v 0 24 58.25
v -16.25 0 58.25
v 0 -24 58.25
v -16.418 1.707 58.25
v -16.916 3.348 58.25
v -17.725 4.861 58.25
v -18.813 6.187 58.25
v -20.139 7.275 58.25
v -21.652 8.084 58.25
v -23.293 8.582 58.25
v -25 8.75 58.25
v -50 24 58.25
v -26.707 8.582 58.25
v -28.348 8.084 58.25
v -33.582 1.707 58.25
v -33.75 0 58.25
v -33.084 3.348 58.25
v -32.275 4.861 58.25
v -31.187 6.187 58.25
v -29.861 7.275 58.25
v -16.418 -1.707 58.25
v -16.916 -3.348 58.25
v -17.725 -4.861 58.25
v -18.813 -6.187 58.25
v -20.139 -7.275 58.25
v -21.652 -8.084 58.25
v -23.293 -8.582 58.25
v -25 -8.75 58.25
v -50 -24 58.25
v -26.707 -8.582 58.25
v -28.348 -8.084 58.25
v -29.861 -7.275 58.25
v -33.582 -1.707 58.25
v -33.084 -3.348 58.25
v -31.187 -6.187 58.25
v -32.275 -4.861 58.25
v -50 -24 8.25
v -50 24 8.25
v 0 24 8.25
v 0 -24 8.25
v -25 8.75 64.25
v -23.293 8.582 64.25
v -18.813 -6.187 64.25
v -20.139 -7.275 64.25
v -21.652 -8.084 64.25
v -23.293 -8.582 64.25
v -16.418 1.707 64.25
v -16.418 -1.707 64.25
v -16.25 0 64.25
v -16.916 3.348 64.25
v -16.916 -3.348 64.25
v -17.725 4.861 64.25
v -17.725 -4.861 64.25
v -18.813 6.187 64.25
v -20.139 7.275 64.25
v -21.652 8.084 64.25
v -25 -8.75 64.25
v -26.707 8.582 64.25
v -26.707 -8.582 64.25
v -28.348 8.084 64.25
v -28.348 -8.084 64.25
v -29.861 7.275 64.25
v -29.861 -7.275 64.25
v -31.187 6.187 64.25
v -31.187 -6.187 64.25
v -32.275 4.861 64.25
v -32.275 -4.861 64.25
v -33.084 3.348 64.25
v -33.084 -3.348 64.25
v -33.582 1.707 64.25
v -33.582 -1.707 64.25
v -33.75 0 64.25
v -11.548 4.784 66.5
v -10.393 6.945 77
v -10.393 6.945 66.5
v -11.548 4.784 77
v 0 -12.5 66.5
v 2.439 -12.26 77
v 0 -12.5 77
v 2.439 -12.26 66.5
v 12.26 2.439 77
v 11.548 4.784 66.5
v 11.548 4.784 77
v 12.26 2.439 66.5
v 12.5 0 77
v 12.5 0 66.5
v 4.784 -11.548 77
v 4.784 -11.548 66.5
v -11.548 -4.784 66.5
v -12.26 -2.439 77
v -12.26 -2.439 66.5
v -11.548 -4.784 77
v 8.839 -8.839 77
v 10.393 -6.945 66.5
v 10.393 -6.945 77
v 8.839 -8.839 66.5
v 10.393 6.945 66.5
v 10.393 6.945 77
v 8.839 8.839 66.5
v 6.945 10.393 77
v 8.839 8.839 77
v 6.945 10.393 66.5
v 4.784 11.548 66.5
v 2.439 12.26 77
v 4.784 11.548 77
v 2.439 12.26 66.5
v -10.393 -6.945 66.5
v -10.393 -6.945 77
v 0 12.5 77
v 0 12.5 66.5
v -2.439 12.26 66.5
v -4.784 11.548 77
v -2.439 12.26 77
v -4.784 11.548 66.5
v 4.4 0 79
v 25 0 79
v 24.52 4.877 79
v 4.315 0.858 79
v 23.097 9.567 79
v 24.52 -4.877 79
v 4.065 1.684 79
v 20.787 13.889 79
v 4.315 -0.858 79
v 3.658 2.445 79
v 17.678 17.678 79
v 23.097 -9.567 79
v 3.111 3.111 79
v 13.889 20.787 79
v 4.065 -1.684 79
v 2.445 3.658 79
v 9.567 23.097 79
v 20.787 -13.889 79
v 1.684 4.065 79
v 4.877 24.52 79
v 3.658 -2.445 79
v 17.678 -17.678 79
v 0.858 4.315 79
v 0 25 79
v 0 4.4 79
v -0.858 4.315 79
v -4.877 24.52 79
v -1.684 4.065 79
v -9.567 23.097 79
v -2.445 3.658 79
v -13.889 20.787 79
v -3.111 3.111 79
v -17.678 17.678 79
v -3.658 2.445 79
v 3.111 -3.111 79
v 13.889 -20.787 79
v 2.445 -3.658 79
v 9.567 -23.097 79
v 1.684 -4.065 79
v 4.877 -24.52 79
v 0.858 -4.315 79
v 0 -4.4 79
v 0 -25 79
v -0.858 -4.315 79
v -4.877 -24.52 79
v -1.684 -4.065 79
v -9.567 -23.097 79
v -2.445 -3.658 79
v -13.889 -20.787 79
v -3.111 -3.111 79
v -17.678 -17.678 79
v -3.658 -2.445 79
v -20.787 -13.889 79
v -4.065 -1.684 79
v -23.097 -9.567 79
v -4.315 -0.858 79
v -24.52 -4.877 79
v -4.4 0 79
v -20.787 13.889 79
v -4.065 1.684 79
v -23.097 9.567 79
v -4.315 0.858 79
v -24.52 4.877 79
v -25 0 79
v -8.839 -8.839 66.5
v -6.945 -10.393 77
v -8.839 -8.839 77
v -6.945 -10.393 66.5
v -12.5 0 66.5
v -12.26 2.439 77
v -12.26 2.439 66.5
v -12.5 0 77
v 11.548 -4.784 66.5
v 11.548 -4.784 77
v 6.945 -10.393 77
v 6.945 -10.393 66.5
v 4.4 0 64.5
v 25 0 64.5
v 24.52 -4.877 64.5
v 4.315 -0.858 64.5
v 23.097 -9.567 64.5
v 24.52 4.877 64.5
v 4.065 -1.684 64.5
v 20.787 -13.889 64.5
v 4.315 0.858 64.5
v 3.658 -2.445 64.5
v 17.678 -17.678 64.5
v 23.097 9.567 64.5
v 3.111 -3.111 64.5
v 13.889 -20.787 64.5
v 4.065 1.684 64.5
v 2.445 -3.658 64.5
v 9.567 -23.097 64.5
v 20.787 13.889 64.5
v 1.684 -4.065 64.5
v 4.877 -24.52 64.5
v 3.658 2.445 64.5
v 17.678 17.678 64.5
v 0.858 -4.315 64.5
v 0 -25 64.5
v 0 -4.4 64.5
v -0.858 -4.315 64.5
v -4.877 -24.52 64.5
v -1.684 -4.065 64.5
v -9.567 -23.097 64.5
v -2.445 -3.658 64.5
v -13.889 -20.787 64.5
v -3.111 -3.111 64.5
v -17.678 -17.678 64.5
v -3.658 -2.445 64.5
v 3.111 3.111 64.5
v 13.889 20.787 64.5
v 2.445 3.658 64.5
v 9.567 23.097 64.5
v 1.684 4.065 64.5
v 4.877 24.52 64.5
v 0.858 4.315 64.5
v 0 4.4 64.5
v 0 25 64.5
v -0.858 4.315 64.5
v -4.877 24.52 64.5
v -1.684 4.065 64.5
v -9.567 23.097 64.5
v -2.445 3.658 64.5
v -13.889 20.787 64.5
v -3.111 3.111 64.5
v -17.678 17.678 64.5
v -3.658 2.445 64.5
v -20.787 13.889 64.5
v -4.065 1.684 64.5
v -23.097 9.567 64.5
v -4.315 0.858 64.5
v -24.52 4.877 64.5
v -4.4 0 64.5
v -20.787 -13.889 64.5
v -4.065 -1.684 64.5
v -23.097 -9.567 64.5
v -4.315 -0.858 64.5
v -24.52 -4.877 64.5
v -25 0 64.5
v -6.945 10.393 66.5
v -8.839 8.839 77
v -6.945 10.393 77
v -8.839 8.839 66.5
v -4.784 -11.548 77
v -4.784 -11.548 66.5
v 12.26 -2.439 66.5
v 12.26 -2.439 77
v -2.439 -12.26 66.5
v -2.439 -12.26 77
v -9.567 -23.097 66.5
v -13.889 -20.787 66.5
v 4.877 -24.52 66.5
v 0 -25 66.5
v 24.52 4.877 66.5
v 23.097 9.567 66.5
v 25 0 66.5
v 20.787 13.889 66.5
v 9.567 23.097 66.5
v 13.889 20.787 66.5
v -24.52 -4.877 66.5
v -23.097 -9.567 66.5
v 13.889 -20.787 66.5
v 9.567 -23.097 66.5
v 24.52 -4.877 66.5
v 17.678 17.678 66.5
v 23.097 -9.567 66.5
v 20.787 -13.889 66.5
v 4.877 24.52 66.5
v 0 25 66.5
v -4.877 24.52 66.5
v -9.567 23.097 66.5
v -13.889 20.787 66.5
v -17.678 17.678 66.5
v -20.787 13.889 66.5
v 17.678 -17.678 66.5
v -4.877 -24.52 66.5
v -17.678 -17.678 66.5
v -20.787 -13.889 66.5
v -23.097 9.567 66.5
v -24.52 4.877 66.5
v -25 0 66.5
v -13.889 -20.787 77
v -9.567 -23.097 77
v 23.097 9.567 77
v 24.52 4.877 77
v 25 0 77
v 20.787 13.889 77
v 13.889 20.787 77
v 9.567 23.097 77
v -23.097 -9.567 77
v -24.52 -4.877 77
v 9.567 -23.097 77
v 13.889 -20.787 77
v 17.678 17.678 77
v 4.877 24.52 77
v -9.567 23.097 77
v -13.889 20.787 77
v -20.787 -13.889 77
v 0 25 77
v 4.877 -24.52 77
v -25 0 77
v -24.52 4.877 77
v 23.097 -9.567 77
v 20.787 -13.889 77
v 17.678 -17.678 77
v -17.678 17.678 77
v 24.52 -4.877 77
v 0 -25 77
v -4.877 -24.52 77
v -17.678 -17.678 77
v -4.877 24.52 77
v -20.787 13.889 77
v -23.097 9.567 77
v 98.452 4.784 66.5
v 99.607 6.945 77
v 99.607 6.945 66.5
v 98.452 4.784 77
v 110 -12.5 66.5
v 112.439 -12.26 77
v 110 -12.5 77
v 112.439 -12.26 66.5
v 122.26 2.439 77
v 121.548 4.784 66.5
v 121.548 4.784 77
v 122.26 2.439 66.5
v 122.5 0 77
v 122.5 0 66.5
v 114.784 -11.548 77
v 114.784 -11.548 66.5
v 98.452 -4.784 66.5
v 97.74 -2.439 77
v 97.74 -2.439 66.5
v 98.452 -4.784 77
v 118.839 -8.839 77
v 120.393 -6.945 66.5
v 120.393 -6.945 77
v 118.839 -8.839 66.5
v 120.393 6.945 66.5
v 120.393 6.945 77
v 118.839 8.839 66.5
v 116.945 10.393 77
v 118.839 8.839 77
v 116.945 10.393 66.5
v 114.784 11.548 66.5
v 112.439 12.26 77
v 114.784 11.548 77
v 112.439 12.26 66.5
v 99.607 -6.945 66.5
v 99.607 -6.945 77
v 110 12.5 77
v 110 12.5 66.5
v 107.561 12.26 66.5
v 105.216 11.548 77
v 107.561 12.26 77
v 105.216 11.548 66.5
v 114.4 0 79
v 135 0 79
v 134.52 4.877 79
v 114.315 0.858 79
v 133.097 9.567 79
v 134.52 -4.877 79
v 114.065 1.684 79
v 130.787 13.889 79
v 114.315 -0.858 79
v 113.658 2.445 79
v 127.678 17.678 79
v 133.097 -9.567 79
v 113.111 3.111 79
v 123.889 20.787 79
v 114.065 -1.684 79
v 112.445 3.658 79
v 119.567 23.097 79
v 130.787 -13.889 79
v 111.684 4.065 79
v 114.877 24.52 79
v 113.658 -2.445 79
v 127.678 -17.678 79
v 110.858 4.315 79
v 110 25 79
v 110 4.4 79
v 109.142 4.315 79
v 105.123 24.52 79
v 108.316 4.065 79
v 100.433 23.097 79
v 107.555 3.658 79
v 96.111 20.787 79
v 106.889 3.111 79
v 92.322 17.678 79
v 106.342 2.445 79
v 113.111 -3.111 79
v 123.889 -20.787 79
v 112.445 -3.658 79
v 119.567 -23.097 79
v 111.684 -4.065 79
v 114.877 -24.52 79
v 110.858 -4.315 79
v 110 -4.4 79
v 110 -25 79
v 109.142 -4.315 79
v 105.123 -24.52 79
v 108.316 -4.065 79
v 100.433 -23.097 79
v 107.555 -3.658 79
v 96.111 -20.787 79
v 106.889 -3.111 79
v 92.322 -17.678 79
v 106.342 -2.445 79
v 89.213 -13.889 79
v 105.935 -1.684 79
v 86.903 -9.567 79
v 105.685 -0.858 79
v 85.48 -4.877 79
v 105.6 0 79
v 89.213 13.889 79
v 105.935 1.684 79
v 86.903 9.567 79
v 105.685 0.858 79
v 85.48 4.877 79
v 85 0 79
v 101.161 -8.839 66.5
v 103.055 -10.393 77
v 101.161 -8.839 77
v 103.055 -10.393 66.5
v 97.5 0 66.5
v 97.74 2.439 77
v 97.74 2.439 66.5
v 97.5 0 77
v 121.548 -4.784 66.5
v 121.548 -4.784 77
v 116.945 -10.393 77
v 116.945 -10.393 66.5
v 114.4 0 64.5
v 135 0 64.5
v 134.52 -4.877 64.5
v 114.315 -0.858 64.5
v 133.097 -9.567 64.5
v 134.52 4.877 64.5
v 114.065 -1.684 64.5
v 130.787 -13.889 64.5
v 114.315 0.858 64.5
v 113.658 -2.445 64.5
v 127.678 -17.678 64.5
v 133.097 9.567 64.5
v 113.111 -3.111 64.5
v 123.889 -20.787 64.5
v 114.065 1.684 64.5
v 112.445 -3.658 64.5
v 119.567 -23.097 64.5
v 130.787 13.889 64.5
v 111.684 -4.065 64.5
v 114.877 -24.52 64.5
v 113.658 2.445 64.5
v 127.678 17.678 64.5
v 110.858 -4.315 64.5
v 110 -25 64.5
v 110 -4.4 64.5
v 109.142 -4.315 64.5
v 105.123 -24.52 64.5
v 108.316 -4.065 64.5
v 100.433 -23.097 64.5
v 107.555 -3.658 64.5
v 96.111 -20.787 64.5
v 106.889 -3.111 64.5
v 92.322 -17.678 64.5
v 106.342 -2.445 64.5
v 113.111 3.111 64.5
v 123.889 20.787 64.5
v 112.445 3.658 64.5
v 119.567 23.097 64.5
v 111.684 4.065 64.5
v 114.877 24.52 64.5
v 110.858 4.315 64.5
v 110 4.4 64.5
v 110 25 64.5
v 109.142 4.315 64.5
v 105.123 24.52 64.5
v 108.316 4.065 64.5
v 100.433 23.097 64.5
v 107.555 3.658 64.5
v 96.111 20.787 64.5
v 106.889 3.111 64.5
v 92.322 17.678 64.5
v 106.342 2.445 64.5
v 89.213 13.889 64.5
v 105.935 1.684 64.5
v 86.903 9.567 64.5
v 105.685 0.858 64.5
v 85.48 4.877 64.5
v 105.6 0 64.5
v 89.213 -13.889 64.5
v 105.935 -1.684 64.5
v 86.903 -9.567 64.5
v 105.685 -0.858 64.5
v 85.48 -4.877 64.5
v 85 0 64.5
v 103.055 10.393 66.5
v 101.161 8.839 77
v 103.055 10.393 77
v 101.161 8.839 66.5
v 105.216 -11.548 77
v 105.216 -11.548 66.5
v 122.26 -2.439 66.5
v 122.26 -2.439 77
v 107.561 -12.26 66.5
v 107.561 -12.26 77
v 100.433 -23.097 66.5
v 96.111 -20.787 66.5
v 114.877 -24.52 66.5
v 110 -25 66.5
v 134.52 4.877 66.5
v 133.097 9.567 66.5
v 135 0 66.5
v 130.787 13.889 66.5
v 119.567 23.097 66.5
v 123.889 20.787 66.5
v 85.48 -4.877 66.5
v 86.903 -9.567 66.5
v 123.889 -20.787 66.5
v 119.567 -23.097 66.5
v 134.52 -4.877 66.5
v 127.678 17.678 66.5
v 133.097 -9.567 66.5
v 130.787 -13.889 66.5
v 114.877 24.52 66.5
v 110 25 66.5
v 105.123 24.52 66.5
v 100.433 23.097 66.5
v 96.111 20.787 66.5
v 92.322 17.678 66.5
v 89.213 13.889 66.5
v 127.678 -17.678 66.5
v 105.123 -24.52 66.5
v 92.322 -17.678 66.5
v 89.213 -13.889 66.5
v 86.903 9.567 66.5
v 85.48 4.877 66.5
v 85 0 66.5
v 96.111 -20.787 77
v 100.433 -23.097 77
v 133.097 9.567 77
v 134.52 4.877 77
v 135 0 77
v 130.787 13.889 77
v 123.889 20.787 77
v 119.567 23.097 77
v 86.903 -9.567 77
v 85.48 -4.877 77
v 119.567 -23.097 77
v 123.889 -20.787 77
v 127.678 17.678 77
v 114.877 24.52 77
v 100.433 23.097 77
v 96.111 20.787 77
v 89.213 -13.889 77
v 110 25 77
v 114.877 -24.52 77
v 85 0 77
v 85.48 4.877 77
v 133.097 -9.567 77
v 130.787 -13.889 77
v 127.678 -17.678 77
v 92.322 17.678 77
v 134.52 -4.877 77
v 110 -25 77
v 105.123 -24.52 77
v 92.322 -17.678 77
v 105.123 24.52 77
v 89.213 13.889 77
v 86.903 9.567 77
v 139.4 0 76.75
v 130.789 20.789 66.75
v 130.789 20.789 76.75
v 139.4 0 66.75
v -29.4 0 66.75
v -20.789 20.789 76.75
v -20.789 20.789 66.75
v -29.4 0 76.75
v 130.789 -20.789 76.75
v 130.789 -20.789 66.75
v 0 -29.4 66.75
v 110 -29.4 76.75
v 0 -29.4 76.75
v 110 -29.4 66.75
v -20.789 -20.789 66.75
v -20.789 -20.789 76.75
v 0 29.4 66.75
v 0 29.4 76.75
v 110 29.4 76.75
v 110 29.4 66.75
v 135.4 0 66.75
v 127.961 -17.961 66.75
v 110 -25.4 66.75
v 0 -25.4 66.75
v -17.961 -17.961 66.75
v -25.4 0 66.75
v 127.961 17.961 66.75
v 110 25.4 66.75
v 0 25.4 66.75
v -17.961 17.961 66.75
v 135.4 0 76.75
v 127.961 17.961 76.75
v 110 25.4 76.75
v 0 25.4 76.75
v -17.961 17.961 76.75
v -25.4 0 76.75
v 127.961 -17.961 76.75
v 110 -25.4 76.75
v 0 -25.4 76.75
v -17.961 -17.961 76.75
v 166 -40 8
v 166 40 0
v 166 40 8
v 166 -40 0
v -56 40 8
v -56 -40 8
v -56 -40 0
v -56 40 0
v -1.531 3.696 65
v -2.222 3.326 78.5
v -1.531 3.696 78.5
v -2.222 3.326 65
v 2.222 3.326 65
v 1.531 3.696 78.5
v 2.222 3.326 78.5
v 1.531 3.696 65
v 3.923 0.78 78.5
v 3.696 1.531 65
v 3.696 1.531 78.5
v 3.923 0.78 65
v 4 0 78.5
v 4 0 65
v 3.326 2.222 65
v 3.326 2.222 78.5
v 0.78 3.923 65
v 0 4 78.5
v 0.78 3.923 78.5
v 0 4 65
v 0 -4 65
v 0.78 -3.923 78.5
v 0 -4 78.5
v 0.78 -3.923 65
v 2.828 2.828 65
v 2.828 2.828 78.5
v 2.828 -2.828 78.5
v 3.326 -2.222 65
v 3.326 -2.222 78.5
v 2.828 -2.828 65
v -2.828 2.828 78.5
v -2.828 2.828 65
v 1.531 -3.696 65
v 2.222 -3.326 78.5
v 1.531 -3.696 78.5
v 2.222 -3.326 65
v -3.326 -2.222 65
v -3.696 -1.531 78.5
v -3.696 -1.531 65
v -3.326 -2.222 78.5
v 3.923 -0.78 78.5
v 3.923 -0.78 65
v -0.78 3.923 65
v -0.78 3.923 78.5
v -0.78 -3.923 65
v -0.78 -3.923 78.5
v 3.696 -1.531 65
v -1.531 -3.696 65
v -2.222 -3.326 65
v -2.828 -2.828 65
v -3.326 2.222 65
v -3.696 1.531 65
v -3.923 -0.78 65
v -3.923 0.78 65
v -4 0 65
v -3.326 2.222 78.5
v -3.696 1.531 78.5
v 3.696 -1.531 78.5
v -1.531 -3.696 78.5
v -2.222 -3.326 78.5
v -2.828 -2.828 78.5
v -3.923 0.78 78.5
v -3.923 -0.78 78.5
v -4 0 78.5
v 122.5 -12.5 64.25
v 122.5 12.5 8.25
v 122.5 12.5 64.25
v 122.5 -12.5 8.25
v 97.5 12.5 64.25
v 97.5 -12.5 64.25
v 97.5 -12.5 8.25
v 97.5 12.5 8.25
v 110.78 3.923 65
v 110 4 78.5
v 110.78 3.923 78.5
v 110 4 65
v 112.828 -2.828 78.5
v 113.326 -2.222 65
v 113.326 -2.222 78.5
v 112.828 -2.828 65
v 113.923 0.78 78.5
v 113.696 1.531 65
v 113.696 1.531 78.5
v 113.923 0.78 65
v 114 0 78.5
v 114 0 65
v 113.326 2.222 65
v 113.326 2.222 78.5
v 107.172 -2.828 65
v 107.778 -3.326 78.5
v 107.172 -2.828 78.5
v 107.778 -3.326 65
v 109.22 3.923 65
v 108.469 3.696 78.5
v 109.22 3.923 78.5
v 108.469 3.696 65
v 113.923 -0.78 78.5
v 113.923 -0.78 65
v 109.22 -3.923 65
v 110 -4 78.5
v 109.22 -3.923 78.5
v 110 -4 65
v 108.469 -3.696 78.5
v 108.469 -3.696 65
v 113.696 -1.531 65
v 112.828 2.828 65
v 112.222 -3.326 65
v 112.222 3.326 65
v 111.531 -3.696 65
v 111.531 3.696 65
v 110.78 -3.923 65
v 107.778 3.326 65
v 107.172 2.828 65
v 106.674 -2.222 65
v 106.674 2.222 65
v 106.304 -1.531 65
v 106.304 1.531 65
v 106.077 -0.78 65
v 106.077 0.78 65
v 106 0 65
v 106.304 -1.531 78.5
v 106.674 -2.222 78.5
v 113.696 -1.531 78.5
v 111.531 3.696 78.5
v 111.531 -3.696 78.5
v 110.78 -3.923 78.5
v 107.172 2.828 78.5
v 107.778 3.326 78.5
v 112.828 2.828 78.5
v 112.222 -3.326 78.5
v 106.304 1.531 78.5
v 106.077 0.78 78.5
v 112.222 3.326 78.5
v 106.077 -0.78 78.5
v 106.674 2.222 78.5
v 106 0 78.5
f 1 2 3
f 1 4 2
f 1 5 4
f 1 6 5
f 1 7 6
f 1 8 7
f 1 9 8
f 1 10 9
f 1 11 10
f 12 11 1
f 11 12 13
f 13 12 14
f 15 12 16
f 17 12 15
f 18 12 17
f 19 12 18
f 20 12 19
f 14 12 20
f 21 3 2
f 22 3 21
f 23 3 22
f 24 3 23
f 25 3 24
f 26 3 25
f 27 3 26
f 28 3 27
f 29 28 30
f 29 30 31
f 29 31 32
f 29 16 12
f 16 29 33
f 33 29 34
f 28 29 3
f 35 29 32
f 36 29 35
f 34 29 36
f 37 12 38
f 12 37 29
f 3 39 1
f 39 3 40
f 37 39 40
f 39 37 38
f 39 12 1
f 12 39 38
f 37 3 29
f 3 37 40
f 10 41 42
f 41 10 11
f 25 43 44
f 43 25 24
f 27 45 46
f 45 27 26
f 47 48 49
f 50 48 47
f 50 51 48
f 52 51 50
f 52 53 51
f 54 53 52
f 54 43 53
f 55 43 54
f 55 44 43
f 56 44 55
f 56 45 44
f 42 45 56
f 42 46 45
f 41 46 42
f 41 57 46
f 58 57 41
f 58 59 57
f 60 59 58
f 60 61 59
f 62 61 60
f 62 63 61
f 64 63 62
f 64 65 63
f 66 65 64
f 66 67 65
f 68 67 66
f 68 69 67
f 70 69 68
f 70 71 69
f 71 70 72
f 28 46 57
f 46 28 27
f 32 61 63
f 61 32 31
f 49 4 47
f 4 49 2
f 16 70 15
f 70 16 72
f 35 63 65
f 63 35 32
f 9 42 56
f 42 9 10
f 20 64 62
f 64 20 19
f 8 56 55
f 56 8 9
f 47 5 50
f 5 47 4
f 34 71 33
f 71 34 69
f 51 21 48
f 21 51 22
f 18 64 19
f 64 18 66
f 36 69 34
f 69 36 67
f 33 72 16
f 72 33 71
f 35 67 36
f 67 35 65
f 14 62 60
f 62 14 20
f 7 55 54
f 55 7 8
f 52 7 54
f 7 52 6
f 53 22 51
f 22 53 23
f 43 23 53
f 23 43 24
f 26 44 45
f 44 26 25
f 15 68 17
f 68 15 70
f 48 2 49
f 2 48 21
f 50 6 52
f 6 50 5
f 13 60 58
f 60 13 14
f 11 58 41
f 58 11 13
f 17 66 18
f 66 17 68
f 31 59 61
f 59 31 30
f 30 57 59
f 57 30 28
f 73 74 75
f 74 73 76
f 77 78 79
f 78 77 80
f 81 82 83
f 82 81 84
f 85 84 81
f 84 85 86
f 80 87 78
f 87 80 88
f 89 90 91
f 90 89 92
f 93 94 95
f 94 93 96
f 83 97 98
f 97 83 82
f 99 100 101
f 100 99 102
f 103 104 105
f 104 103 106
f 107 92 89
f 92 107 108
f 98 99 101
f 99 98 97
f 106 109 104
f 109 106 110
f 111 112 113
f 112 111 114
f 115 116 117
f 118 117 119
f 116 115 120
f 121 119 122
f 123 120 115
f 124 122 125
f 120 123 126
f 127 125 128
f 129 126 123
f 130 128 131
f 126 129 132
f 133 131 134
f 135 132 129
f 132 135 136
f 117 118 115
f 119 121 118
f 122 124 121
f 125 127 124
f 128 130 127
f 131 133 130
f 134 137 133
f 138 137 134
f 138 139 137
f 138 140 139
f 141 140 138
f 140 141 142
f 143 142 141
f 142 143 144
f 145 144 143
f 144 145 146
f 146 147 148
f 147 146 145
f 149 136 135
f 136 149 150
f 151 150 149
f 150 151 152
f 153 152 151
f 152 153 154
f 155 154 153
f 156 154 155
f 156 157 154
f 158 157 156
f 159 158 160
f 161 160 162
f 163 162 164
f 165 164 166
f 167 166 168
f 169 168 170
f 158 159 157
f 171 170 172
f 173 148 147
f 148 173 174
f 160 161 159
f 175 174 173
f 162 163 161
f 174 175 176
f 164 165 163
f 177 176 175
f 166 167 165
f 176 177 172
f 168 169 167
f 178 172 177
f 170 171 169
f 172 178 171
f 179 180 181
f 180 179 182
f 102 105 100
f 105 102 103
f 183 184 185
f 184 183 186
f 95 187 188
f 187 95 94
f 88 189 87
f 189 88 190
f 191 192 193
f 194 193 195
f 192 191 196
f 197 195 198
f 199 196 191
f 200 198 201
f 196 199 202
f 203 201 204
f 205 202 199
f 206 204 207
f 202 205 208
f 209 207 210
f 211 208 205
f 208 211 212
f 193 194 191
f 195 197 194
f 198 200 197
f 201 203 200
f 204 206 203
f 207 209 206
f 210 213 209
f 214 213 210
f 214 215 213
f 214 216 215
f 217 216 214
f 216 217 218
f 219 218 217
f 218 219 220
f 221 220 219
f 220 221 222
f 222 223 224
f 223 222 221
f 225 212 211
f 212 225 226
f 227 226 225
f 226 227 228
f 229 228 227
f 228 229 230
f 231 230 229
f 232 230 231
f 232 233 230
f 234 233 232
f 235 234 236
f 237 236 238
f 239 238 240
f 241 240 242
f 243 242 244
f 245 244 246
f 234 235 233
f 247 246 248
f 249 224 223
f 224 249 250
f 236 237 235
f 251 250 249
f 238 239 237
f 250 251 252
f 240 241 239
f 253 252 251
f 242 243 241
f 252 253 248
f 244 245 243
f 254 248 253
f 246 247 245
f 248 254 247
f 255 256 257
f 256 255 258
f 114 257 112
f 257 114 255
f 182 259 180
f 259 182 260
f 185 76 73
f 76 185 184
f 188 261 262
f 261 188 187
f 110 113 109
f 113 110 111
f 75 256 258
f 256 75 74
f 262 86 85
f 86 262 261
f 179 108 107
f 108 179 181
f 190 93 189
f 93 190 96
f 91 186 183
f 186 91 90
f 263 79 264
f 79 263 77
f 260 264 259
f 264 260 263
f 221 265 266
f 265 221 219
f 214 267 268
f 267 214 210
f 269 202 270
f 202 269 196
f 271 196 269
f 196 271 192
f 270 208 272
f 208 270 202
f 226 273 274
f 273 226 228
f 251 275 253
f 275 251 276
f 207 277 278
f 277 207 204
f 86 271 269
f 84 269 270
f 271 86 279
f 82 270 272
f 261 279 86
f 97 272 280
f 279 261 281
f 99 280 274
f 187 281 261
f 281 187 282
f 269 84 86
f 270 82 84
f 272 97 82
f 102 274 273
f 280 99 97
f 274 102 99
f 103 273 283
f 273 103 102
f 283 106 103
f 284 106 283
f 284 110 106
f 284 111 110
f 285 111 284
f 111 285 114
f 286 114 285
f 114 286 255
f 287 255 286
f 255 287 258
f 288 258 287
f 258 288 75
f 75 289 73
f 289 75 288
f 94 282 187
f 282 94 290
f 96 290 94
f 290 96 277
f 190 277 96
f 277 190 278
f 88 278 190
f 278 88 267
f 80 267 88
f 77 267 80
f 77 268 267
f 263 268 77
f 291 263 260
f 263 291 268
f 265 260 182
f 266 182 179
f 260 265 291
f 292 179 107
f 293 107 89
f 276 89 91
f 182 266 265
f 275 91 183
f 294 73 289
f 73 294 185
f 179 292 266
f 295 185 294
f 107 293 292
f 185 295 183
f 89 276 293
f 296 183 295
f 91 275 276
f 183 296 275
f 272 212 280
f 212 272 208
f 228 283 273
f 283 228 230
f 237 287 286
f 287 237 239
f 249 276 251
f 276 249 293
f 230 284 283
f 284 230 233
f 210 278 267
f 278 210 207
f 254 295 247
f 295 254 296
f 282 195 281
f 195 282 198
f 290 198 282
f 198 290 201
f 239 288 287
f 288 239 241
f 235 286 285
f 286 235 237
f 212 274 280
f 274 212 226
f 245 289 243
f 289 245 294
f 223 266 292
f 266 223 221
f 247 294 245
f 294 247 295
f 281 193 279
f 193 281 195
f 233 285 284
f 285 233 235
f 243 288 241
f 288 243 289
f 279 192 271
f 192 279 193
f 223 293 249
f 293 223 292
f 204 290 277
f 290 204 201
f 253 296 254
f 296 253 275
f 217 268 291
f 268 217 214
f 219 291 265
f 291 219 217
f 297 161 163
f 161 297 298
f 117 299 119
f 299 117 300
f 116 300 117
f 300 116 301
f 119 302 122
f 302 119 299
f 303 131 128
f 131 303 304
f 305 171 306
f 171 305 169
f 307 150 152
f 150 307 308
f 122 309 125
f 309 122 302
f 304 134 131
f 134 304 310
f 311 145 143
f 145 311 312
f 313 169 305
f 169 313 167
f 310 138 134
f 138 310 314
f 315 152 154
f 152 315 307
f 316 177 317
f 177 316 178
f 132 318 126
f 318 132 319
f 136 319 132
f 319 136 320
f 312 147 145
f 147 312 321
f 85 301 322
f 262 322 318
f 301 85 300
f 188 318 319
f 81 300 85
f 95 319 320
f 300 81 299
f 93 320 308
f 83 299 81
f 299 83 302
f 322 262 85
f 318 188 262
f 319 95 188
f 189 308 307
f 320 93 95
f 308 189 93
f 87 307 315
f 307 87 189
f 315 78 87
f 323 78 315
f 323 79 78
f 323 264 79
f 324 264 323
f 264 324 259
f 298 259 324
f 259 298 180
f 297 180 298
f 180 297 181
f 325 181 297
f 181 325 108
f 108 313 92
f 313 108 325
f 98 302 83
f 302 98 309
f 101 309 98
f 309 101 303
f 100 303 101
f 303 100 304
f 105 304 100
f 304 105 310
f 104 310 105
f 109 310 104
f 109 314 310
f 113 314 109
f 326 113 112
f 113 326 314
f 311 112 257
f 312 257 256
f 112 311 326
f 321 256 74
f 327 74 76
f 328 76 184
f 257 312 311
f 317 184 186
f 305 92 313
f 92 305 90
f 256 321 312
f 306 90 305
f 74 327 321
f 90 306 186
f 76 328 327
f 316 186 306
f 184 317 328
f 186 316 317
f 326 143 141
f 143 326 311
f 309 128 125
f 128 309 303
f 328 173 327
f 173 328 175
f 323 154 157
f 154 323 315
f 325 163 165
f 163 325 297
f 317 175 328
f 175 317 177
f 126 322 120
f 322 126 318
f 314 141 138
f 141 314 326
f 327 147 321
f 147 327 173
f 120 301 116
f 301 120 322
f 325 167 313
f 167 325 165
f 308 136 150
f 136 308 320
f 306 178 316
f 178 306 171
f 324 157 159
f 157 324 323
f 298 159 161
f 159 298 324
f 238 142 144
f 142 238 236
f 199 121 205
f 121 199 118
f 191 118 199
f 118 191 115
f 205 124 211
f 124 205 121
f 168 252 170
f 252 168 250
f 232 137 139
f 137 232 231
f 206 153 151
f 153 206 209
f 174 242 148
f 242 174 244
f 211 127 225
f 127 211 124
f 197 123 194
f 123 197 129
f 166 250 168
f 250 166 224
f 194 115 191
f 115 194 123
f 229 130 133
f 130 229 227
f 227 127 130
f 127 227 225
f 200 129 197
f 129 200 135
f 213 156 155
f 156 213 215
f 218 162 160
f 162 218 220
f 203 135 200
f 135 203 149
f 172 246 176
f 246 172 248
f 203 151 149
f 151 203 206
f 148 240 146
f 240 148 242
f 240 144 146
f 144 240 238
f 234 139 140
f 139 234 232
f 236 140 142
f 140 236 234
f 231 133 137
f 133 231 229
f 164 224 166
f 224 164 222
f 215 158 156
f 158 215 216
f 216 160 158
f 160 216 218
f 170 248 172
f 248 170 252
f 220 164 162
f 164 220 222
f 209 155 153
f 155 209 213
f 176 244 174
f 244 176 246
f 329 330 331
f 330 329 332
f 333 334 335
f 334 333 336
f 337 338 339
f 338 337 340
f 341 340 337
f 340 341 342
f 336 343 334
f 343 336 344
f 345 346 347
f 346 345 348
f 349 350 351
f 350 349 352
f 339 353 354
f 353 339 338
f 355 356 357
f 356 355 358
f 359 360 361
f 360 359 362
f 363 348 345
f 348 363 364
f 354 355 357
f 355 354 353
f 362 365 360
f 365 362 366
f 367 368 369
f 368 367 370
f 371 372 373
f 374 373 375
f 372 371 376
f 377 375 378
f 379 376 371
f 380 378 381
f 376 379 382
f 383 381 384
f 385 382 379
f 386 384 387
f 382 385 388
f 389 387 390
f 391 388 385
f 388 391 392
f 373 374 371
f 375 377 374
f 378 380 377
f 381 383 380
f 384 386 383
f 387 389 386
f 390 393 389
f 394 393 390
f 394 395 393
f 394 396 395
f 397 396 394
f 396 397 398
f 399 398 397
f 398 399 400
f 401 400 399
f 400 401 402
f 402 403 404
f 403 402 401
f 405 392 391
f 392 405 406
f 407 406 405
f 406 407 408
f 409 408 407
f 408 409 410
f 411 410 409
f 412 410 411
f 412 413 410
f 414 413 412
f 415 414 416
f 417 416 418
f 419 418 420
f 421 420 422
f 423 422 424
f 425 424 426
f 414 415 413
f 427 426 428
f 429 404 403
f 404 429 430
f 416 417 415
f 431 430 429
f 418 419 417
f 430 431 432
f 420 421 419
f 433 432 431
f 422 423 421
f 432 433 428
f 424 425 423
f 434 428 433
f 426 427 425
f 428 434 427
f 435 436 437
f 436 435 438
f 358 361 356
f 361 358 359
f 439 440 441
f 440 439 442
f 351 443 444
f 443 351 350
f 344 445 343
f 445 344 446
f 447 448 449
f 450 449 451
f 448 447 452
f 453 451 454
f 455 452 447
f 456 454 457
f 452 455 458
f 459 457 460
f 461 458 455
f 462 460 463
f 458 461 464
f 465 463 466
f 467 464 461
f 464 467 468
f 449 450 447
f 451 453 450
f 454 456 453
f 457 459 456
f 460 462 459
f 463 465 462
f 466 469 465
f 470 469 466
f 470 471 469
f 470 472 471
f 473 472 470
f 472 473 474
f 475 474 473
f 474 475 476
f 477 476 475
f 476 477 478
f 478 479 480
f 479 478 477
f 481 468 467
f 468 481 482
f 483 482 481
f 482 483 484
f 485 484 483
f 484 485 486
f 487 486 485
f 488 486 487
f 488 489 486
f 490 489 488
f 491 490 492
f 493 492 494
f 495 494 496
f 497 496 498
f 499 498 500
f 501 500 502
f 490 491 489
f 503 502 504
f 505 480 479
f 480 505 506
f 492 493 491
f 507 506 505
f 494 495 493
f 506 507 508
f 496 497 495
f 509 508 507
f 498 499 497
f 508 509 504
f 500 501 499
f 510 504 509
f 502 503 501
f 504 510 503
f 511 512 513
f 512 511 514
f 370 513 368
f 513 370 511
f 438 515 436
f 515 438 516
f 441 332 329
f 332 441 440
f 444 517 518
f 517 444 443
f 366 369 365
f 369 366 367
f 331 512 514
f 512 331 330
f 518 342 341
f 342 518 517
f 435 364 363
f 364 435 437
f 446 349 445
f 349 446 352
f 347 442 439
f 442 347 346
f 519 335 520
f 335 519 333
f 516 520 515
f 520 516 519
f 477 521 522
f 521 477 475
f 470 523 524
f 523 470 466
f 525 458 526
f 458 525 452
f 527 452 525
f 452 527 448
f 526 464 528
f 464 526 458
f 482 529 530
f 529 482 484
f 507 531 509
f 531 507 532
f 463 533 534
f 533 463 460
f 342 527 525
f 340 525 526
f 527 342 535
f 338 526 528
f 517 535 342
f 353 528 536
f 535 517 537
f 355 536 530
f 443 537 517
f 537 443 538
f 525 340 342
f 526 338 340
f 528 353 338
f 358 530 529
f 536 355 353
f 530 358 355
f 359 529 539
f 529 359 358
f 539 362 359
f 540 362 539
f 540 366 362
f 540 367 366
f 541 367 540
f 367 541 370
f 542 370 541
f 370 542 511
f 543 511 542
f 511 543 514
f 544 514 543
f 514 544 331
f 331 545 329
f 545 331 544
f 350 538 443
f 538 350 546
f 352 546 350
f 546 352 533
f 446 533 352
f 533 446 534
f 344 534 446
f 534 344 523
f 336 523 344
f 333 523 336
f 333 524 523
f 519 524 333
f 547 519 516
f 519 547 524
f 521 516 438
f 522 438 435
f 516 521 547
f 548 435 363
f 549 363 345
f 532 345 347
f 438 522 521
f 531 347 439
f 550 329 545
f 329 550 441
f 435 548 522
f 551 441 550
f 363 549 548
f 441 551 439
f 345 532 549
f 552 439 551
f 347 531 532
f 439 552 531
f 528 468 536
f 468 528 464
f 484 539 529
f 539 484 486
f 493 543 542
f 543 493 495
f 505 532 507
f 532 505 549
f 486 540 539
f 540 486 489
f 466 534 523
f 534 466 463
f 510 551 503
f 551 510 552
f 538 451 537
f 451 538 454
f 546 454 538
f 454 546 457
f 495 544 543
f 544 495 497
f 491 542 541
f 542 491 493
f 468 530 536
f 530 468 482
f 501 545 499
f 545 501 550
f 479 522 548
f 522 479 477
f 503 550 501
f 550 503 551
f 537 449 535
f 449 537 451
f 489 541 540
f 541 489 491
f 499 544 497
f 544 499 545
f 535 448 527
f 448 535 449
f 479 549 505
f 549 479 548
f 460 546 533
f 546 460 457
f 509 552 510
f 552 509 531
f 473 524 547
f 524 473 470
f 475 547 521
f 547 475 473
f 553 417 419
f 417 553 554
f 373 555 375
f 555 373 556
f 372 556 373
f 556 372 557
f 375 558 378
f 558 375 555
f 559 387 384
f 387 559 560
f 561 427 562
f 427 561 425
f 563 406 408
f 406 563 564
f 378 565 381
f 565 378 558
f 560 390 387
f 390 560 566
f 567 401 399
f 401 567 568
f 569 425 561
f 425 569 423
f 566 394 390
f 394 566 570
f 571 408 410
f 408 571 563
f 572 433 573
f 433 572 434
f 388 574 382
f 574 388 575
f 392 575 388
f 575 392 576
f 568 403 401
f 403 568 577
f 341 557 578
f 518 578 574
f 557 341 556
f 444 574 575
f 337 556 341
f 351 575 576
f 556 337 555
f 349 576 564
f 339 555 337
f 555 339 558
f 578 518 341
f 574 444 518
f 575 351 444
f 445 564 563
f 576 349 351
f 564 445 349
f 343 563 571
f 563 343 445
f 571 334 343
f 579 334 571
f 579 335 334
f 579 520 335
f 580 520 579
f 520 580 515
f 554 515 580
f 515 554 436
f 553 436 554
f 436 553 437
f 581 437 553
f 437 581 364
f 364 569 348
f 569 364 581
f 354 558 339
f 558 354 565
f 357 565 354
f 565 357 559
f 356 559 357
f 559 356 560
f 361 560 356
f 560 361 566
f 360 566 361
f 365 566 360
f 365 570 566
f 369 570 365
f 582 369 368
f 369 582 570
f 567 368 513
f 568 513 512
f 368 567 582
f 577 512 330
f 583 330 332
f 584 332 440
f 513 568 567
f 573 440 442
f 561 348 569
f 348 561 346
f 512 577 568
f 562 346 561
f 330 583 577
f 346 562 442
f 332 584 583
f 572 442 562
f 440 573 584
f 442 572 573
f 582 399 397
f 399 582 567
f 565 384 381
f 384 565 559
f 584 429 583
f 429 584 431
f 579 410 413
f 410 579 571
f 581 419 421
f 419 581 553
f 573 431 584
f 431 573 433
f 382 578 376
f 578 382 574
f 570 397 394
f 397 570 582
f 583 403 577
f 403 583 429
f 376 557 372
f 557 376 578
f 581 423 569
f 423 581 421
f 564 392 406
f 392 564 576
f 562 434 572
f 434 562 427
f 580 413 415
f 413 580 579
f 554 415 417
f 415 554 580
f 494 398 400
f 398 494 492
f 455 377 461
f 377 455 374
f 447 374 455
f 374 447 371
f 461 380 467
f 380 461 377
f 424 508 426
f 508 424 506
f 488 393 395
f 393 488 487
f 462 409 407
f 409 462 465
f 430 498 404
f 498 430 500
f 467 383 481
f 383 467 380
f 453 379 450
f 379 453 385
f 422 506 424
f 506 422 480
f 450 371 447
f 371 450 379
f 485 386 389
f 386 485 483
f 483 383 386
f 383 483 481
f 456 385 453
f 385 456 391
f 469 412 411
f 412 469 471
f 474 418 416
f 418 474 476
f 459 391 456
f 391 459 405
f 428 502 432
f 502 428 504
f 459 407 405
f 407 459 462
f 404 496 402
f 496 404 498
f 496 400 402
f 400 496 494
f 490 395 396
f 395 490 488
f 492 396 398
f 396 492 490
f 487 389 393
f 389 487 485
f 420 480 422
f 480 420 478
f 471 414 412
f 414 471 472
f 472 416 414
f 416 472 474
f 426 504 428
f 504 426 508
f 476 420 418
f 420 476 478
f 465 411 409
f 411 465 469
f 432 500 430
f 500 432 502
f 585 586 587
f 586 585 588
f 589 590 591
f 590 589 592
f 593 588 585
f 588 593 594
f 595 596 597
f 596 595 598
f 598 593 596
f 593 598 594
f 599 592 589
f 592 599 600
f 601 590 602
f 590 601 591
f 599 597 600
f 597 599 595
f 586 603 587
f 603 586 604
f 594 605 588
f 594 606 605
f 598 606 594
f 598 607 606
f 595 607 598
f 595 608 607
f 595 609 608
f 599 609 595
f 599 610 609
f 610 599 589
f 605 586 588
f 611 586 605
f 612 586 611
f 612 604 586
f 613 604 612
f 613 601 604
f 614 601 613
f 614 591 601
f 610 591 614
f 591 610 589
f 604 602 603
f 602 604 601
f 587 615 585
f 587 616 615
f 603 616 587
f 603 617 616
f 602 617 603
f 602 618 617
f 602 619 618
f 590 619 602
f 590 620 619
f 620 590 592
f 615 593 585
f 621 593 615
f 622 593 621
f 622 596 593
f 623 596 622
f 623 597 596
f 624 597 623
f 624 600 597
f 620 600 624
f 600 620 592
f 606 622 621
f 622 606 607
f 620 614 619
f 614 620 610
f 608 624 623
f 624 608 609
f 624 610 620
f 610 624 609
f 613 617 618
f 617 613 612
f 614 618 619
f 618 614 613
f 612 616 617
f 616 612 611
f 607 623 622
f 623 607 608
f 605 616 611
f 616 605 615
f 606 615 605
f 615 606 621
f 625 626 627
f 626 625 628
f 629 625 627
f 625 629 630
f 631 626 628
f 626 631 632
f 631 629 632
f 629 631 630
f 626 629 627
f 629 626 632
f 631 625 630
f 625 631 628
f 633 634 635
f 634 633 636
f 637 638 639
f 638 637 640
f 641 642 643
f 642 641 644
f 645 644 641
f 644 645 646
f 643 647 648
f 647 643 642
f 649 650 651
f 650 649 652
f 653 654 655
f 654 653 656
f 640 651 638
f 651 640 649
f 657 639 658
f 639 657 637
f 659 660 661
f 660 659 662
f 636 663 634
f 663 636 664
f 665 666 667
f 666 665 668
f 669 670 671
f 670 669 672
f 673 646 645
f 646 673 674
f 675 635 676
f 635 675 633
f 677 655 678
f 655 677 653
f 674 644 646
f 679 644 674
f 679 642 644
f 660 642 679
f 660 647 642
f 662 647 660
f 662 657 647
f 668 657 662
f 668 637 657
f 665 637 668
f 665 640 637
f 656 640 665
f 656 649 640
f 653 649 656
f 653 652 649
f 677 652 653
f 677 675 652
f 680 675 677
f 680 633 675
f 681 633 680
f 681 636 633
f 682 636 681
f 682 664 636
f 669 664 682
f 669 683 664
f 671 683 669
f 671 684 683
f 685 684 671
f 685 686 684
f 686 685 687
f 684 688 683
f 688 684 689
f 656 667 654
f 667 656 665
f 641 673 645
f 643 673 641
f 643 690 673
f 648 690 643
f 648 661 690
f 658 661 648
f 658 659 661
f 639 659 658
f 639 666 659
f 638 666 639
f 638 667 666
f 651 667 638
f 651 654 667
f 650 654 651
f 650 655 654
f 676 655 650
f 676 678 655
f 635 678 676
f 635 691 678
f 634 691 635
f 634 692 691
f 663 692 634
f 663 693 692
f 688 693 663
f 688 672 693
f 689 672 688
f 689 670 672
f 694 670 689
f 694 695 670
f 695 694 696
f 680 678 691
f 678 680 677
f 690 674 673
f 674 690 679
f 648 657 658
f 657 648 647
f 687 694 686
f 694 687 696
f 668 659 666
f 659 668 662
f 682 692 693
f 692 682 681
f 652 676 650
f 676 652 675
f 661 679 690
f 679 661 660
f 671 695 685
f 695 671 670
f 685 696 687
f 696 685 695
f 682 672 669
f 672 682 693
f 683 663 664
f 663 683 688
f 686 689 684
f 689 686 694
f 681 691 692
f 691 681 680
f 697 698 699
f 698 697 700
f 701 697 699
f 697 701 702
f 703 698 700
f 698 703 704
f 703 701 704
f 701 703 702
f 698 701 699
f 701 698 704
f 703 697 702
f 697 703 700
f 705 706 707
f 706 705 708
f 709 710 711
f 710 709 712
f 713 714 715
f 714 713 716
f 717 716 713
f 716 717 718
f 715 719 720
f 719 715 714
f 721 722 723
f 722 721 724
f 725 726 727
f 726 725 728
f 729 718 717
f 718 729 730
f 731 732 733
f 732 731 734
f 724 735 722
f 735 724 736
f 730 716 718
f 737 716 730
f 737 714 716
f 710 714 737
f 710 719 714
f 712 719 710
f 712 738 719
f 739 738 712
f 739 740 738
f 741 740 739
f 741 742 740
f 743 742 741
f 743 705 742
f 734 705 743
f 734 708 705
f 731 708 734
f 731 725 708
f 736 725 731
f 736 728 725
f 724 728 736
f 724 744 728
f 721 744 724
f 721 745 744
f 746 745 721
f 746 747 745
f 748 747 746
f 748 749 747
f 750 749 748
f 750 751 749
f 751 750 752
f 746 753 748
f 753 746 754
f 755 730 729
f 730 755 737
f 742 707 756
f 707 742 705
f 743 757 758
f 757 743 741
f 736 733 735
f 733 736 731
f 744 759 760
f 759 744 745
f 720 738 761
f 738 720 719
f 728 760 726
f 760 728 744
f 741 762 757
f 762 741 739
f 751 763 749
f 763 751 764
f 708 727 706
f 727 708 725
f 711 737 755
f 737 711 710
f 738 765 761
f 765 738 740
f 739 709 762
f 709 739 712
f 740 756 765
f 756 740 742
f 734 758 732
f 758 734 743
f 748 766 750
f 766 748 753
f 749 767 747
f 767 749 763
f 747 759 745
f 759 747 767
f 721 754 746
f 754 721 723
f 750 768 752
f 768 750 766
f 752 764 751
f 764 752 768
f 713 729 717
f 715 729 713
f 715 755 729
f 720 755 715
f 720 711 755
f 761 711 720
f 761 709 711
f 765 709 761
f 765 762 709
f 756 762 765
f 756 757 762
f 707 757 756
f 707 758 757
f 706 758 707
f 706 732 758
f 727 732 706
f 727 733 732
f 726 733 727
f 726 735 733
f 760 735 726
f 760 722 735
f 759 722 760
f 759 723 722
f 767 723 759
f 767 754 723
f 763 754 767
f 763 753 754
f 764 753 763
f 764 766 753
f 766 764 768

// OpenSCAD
$fn = 32;

// ------------------------------------------------------------------------
// Motor belt drive: span 110 mm, pulleys d50, belt 10 mm wide
// Every part is its own module, assembly() places every instance.
// ------------------------------------------------------------------------

// --- part 1 ---
module base_plate() {
  difference() {
    translate([-111, -40, 0]) cube([222, 80, 8]);
  }
}

// --- part 2 ---
module motor() {
  union() {
    translate([-25, -24, 0]) cube([50, 48, 50]);
    translate([28, 0, 25]) rotate([0, 90, 0]) cylinder(h = 6, d = 17.5, center = true);
  }
}

// --- part 3 ---
module drive_shaft() {
  translate([0, 0, -6.75]) cylinder(h = 13.5, d = 8);
}

// --- part 4 ---
module pulley_drive() {
  difference() {
    union() {
      cylinder(h = 14.5, d = 25);
      cylinder(h = 2, d = 50);
      translate([0, 0, 12.5]) cylinder(h = 2, d = 50);
    }
    translate([0, 0, -1]) cylinder(h = 16.5, d = 8.8);
  }
}

// --- part 5 ---
module idler_post() {
  translate([-12.5, -12.5, 0]) cube([25, 25, 56]);
}

// --- part 6 ---
module driven_shaft() {
  translate([0, 0, -6.75]) cylinder(h = 13.5, d = 8);
}

// --- part 7 ---
module pulley_driven() {
  difference() {
    union() {
      cylinder(h = 14.5, d = 25);
      cylinder(h = 2, d = 50);
      translate([0, 0, 12.5]) cylinder(h = 2, d = 50);
    }
    translate([0, 0, -1]) cylinder(h = 16.5, d = 8.8);
  }
}

// --- part 8 ---
module drive_belt() {
  difference() {
    linear_extrude(height = 10) polygon(points = concat([for (a = [90 : 45 : 270]) [29.4 * cos(a), 29.4 * sin(a)]], [for (a = [270 : 45 : 450]) [110 + 29.4 * cos(a), 29.4 * sin(a)]]));
    translate([0, 0, -1]) linear_extrude(height = 12) polygon(points = concat([for (a = [90 : 45 : 270]) [25.4 * cos(a), 25.4 * sin(a)]], [for (a = [270 : 45 : 450]) [110 + 25.4 * cos(a), 25.4 * sin(a)]]));
  }
}

// --- assembly ---
module assembly() {
  color([0.80, 0.24, 0.20]) translate([55, 0, 0]) rotate([0, 0, 0]) base_plate();
  color([0.20, 0.45, 0.75]) translate([0, 0, 33.25]) rotate([0, 270, 0]) motor();
  color([0.25, 0.62, 0.32]) translate([0, 0, 71.75]) rotate([0, 0, 0]) drive_shaft();
  color([0.92, 0.70, 0.18]) translate([0, 0, 64.5]) rotate([0, 0, 0]) pulley_drive();
  color([0.58, 0.35, 0.70]) translate([110, 0, 8.25]) rotate([0, 0, 0]) idler_post();
  color([0.16, 0.66, 0.66]) translate([110, 0, 71.75]) rotate([0, 0, 0]) driven_shaft();
  color([0.85, 0.48, 0.18]) translate([110, 0, 64.5]) rotate([0, 0, 0]) pulley_driven();
  color([0.55, 0.60, 0.65]) translate([0, 0, 66.75]) rotate([0, 0, 0]) drive_belt();
}

assembly();
